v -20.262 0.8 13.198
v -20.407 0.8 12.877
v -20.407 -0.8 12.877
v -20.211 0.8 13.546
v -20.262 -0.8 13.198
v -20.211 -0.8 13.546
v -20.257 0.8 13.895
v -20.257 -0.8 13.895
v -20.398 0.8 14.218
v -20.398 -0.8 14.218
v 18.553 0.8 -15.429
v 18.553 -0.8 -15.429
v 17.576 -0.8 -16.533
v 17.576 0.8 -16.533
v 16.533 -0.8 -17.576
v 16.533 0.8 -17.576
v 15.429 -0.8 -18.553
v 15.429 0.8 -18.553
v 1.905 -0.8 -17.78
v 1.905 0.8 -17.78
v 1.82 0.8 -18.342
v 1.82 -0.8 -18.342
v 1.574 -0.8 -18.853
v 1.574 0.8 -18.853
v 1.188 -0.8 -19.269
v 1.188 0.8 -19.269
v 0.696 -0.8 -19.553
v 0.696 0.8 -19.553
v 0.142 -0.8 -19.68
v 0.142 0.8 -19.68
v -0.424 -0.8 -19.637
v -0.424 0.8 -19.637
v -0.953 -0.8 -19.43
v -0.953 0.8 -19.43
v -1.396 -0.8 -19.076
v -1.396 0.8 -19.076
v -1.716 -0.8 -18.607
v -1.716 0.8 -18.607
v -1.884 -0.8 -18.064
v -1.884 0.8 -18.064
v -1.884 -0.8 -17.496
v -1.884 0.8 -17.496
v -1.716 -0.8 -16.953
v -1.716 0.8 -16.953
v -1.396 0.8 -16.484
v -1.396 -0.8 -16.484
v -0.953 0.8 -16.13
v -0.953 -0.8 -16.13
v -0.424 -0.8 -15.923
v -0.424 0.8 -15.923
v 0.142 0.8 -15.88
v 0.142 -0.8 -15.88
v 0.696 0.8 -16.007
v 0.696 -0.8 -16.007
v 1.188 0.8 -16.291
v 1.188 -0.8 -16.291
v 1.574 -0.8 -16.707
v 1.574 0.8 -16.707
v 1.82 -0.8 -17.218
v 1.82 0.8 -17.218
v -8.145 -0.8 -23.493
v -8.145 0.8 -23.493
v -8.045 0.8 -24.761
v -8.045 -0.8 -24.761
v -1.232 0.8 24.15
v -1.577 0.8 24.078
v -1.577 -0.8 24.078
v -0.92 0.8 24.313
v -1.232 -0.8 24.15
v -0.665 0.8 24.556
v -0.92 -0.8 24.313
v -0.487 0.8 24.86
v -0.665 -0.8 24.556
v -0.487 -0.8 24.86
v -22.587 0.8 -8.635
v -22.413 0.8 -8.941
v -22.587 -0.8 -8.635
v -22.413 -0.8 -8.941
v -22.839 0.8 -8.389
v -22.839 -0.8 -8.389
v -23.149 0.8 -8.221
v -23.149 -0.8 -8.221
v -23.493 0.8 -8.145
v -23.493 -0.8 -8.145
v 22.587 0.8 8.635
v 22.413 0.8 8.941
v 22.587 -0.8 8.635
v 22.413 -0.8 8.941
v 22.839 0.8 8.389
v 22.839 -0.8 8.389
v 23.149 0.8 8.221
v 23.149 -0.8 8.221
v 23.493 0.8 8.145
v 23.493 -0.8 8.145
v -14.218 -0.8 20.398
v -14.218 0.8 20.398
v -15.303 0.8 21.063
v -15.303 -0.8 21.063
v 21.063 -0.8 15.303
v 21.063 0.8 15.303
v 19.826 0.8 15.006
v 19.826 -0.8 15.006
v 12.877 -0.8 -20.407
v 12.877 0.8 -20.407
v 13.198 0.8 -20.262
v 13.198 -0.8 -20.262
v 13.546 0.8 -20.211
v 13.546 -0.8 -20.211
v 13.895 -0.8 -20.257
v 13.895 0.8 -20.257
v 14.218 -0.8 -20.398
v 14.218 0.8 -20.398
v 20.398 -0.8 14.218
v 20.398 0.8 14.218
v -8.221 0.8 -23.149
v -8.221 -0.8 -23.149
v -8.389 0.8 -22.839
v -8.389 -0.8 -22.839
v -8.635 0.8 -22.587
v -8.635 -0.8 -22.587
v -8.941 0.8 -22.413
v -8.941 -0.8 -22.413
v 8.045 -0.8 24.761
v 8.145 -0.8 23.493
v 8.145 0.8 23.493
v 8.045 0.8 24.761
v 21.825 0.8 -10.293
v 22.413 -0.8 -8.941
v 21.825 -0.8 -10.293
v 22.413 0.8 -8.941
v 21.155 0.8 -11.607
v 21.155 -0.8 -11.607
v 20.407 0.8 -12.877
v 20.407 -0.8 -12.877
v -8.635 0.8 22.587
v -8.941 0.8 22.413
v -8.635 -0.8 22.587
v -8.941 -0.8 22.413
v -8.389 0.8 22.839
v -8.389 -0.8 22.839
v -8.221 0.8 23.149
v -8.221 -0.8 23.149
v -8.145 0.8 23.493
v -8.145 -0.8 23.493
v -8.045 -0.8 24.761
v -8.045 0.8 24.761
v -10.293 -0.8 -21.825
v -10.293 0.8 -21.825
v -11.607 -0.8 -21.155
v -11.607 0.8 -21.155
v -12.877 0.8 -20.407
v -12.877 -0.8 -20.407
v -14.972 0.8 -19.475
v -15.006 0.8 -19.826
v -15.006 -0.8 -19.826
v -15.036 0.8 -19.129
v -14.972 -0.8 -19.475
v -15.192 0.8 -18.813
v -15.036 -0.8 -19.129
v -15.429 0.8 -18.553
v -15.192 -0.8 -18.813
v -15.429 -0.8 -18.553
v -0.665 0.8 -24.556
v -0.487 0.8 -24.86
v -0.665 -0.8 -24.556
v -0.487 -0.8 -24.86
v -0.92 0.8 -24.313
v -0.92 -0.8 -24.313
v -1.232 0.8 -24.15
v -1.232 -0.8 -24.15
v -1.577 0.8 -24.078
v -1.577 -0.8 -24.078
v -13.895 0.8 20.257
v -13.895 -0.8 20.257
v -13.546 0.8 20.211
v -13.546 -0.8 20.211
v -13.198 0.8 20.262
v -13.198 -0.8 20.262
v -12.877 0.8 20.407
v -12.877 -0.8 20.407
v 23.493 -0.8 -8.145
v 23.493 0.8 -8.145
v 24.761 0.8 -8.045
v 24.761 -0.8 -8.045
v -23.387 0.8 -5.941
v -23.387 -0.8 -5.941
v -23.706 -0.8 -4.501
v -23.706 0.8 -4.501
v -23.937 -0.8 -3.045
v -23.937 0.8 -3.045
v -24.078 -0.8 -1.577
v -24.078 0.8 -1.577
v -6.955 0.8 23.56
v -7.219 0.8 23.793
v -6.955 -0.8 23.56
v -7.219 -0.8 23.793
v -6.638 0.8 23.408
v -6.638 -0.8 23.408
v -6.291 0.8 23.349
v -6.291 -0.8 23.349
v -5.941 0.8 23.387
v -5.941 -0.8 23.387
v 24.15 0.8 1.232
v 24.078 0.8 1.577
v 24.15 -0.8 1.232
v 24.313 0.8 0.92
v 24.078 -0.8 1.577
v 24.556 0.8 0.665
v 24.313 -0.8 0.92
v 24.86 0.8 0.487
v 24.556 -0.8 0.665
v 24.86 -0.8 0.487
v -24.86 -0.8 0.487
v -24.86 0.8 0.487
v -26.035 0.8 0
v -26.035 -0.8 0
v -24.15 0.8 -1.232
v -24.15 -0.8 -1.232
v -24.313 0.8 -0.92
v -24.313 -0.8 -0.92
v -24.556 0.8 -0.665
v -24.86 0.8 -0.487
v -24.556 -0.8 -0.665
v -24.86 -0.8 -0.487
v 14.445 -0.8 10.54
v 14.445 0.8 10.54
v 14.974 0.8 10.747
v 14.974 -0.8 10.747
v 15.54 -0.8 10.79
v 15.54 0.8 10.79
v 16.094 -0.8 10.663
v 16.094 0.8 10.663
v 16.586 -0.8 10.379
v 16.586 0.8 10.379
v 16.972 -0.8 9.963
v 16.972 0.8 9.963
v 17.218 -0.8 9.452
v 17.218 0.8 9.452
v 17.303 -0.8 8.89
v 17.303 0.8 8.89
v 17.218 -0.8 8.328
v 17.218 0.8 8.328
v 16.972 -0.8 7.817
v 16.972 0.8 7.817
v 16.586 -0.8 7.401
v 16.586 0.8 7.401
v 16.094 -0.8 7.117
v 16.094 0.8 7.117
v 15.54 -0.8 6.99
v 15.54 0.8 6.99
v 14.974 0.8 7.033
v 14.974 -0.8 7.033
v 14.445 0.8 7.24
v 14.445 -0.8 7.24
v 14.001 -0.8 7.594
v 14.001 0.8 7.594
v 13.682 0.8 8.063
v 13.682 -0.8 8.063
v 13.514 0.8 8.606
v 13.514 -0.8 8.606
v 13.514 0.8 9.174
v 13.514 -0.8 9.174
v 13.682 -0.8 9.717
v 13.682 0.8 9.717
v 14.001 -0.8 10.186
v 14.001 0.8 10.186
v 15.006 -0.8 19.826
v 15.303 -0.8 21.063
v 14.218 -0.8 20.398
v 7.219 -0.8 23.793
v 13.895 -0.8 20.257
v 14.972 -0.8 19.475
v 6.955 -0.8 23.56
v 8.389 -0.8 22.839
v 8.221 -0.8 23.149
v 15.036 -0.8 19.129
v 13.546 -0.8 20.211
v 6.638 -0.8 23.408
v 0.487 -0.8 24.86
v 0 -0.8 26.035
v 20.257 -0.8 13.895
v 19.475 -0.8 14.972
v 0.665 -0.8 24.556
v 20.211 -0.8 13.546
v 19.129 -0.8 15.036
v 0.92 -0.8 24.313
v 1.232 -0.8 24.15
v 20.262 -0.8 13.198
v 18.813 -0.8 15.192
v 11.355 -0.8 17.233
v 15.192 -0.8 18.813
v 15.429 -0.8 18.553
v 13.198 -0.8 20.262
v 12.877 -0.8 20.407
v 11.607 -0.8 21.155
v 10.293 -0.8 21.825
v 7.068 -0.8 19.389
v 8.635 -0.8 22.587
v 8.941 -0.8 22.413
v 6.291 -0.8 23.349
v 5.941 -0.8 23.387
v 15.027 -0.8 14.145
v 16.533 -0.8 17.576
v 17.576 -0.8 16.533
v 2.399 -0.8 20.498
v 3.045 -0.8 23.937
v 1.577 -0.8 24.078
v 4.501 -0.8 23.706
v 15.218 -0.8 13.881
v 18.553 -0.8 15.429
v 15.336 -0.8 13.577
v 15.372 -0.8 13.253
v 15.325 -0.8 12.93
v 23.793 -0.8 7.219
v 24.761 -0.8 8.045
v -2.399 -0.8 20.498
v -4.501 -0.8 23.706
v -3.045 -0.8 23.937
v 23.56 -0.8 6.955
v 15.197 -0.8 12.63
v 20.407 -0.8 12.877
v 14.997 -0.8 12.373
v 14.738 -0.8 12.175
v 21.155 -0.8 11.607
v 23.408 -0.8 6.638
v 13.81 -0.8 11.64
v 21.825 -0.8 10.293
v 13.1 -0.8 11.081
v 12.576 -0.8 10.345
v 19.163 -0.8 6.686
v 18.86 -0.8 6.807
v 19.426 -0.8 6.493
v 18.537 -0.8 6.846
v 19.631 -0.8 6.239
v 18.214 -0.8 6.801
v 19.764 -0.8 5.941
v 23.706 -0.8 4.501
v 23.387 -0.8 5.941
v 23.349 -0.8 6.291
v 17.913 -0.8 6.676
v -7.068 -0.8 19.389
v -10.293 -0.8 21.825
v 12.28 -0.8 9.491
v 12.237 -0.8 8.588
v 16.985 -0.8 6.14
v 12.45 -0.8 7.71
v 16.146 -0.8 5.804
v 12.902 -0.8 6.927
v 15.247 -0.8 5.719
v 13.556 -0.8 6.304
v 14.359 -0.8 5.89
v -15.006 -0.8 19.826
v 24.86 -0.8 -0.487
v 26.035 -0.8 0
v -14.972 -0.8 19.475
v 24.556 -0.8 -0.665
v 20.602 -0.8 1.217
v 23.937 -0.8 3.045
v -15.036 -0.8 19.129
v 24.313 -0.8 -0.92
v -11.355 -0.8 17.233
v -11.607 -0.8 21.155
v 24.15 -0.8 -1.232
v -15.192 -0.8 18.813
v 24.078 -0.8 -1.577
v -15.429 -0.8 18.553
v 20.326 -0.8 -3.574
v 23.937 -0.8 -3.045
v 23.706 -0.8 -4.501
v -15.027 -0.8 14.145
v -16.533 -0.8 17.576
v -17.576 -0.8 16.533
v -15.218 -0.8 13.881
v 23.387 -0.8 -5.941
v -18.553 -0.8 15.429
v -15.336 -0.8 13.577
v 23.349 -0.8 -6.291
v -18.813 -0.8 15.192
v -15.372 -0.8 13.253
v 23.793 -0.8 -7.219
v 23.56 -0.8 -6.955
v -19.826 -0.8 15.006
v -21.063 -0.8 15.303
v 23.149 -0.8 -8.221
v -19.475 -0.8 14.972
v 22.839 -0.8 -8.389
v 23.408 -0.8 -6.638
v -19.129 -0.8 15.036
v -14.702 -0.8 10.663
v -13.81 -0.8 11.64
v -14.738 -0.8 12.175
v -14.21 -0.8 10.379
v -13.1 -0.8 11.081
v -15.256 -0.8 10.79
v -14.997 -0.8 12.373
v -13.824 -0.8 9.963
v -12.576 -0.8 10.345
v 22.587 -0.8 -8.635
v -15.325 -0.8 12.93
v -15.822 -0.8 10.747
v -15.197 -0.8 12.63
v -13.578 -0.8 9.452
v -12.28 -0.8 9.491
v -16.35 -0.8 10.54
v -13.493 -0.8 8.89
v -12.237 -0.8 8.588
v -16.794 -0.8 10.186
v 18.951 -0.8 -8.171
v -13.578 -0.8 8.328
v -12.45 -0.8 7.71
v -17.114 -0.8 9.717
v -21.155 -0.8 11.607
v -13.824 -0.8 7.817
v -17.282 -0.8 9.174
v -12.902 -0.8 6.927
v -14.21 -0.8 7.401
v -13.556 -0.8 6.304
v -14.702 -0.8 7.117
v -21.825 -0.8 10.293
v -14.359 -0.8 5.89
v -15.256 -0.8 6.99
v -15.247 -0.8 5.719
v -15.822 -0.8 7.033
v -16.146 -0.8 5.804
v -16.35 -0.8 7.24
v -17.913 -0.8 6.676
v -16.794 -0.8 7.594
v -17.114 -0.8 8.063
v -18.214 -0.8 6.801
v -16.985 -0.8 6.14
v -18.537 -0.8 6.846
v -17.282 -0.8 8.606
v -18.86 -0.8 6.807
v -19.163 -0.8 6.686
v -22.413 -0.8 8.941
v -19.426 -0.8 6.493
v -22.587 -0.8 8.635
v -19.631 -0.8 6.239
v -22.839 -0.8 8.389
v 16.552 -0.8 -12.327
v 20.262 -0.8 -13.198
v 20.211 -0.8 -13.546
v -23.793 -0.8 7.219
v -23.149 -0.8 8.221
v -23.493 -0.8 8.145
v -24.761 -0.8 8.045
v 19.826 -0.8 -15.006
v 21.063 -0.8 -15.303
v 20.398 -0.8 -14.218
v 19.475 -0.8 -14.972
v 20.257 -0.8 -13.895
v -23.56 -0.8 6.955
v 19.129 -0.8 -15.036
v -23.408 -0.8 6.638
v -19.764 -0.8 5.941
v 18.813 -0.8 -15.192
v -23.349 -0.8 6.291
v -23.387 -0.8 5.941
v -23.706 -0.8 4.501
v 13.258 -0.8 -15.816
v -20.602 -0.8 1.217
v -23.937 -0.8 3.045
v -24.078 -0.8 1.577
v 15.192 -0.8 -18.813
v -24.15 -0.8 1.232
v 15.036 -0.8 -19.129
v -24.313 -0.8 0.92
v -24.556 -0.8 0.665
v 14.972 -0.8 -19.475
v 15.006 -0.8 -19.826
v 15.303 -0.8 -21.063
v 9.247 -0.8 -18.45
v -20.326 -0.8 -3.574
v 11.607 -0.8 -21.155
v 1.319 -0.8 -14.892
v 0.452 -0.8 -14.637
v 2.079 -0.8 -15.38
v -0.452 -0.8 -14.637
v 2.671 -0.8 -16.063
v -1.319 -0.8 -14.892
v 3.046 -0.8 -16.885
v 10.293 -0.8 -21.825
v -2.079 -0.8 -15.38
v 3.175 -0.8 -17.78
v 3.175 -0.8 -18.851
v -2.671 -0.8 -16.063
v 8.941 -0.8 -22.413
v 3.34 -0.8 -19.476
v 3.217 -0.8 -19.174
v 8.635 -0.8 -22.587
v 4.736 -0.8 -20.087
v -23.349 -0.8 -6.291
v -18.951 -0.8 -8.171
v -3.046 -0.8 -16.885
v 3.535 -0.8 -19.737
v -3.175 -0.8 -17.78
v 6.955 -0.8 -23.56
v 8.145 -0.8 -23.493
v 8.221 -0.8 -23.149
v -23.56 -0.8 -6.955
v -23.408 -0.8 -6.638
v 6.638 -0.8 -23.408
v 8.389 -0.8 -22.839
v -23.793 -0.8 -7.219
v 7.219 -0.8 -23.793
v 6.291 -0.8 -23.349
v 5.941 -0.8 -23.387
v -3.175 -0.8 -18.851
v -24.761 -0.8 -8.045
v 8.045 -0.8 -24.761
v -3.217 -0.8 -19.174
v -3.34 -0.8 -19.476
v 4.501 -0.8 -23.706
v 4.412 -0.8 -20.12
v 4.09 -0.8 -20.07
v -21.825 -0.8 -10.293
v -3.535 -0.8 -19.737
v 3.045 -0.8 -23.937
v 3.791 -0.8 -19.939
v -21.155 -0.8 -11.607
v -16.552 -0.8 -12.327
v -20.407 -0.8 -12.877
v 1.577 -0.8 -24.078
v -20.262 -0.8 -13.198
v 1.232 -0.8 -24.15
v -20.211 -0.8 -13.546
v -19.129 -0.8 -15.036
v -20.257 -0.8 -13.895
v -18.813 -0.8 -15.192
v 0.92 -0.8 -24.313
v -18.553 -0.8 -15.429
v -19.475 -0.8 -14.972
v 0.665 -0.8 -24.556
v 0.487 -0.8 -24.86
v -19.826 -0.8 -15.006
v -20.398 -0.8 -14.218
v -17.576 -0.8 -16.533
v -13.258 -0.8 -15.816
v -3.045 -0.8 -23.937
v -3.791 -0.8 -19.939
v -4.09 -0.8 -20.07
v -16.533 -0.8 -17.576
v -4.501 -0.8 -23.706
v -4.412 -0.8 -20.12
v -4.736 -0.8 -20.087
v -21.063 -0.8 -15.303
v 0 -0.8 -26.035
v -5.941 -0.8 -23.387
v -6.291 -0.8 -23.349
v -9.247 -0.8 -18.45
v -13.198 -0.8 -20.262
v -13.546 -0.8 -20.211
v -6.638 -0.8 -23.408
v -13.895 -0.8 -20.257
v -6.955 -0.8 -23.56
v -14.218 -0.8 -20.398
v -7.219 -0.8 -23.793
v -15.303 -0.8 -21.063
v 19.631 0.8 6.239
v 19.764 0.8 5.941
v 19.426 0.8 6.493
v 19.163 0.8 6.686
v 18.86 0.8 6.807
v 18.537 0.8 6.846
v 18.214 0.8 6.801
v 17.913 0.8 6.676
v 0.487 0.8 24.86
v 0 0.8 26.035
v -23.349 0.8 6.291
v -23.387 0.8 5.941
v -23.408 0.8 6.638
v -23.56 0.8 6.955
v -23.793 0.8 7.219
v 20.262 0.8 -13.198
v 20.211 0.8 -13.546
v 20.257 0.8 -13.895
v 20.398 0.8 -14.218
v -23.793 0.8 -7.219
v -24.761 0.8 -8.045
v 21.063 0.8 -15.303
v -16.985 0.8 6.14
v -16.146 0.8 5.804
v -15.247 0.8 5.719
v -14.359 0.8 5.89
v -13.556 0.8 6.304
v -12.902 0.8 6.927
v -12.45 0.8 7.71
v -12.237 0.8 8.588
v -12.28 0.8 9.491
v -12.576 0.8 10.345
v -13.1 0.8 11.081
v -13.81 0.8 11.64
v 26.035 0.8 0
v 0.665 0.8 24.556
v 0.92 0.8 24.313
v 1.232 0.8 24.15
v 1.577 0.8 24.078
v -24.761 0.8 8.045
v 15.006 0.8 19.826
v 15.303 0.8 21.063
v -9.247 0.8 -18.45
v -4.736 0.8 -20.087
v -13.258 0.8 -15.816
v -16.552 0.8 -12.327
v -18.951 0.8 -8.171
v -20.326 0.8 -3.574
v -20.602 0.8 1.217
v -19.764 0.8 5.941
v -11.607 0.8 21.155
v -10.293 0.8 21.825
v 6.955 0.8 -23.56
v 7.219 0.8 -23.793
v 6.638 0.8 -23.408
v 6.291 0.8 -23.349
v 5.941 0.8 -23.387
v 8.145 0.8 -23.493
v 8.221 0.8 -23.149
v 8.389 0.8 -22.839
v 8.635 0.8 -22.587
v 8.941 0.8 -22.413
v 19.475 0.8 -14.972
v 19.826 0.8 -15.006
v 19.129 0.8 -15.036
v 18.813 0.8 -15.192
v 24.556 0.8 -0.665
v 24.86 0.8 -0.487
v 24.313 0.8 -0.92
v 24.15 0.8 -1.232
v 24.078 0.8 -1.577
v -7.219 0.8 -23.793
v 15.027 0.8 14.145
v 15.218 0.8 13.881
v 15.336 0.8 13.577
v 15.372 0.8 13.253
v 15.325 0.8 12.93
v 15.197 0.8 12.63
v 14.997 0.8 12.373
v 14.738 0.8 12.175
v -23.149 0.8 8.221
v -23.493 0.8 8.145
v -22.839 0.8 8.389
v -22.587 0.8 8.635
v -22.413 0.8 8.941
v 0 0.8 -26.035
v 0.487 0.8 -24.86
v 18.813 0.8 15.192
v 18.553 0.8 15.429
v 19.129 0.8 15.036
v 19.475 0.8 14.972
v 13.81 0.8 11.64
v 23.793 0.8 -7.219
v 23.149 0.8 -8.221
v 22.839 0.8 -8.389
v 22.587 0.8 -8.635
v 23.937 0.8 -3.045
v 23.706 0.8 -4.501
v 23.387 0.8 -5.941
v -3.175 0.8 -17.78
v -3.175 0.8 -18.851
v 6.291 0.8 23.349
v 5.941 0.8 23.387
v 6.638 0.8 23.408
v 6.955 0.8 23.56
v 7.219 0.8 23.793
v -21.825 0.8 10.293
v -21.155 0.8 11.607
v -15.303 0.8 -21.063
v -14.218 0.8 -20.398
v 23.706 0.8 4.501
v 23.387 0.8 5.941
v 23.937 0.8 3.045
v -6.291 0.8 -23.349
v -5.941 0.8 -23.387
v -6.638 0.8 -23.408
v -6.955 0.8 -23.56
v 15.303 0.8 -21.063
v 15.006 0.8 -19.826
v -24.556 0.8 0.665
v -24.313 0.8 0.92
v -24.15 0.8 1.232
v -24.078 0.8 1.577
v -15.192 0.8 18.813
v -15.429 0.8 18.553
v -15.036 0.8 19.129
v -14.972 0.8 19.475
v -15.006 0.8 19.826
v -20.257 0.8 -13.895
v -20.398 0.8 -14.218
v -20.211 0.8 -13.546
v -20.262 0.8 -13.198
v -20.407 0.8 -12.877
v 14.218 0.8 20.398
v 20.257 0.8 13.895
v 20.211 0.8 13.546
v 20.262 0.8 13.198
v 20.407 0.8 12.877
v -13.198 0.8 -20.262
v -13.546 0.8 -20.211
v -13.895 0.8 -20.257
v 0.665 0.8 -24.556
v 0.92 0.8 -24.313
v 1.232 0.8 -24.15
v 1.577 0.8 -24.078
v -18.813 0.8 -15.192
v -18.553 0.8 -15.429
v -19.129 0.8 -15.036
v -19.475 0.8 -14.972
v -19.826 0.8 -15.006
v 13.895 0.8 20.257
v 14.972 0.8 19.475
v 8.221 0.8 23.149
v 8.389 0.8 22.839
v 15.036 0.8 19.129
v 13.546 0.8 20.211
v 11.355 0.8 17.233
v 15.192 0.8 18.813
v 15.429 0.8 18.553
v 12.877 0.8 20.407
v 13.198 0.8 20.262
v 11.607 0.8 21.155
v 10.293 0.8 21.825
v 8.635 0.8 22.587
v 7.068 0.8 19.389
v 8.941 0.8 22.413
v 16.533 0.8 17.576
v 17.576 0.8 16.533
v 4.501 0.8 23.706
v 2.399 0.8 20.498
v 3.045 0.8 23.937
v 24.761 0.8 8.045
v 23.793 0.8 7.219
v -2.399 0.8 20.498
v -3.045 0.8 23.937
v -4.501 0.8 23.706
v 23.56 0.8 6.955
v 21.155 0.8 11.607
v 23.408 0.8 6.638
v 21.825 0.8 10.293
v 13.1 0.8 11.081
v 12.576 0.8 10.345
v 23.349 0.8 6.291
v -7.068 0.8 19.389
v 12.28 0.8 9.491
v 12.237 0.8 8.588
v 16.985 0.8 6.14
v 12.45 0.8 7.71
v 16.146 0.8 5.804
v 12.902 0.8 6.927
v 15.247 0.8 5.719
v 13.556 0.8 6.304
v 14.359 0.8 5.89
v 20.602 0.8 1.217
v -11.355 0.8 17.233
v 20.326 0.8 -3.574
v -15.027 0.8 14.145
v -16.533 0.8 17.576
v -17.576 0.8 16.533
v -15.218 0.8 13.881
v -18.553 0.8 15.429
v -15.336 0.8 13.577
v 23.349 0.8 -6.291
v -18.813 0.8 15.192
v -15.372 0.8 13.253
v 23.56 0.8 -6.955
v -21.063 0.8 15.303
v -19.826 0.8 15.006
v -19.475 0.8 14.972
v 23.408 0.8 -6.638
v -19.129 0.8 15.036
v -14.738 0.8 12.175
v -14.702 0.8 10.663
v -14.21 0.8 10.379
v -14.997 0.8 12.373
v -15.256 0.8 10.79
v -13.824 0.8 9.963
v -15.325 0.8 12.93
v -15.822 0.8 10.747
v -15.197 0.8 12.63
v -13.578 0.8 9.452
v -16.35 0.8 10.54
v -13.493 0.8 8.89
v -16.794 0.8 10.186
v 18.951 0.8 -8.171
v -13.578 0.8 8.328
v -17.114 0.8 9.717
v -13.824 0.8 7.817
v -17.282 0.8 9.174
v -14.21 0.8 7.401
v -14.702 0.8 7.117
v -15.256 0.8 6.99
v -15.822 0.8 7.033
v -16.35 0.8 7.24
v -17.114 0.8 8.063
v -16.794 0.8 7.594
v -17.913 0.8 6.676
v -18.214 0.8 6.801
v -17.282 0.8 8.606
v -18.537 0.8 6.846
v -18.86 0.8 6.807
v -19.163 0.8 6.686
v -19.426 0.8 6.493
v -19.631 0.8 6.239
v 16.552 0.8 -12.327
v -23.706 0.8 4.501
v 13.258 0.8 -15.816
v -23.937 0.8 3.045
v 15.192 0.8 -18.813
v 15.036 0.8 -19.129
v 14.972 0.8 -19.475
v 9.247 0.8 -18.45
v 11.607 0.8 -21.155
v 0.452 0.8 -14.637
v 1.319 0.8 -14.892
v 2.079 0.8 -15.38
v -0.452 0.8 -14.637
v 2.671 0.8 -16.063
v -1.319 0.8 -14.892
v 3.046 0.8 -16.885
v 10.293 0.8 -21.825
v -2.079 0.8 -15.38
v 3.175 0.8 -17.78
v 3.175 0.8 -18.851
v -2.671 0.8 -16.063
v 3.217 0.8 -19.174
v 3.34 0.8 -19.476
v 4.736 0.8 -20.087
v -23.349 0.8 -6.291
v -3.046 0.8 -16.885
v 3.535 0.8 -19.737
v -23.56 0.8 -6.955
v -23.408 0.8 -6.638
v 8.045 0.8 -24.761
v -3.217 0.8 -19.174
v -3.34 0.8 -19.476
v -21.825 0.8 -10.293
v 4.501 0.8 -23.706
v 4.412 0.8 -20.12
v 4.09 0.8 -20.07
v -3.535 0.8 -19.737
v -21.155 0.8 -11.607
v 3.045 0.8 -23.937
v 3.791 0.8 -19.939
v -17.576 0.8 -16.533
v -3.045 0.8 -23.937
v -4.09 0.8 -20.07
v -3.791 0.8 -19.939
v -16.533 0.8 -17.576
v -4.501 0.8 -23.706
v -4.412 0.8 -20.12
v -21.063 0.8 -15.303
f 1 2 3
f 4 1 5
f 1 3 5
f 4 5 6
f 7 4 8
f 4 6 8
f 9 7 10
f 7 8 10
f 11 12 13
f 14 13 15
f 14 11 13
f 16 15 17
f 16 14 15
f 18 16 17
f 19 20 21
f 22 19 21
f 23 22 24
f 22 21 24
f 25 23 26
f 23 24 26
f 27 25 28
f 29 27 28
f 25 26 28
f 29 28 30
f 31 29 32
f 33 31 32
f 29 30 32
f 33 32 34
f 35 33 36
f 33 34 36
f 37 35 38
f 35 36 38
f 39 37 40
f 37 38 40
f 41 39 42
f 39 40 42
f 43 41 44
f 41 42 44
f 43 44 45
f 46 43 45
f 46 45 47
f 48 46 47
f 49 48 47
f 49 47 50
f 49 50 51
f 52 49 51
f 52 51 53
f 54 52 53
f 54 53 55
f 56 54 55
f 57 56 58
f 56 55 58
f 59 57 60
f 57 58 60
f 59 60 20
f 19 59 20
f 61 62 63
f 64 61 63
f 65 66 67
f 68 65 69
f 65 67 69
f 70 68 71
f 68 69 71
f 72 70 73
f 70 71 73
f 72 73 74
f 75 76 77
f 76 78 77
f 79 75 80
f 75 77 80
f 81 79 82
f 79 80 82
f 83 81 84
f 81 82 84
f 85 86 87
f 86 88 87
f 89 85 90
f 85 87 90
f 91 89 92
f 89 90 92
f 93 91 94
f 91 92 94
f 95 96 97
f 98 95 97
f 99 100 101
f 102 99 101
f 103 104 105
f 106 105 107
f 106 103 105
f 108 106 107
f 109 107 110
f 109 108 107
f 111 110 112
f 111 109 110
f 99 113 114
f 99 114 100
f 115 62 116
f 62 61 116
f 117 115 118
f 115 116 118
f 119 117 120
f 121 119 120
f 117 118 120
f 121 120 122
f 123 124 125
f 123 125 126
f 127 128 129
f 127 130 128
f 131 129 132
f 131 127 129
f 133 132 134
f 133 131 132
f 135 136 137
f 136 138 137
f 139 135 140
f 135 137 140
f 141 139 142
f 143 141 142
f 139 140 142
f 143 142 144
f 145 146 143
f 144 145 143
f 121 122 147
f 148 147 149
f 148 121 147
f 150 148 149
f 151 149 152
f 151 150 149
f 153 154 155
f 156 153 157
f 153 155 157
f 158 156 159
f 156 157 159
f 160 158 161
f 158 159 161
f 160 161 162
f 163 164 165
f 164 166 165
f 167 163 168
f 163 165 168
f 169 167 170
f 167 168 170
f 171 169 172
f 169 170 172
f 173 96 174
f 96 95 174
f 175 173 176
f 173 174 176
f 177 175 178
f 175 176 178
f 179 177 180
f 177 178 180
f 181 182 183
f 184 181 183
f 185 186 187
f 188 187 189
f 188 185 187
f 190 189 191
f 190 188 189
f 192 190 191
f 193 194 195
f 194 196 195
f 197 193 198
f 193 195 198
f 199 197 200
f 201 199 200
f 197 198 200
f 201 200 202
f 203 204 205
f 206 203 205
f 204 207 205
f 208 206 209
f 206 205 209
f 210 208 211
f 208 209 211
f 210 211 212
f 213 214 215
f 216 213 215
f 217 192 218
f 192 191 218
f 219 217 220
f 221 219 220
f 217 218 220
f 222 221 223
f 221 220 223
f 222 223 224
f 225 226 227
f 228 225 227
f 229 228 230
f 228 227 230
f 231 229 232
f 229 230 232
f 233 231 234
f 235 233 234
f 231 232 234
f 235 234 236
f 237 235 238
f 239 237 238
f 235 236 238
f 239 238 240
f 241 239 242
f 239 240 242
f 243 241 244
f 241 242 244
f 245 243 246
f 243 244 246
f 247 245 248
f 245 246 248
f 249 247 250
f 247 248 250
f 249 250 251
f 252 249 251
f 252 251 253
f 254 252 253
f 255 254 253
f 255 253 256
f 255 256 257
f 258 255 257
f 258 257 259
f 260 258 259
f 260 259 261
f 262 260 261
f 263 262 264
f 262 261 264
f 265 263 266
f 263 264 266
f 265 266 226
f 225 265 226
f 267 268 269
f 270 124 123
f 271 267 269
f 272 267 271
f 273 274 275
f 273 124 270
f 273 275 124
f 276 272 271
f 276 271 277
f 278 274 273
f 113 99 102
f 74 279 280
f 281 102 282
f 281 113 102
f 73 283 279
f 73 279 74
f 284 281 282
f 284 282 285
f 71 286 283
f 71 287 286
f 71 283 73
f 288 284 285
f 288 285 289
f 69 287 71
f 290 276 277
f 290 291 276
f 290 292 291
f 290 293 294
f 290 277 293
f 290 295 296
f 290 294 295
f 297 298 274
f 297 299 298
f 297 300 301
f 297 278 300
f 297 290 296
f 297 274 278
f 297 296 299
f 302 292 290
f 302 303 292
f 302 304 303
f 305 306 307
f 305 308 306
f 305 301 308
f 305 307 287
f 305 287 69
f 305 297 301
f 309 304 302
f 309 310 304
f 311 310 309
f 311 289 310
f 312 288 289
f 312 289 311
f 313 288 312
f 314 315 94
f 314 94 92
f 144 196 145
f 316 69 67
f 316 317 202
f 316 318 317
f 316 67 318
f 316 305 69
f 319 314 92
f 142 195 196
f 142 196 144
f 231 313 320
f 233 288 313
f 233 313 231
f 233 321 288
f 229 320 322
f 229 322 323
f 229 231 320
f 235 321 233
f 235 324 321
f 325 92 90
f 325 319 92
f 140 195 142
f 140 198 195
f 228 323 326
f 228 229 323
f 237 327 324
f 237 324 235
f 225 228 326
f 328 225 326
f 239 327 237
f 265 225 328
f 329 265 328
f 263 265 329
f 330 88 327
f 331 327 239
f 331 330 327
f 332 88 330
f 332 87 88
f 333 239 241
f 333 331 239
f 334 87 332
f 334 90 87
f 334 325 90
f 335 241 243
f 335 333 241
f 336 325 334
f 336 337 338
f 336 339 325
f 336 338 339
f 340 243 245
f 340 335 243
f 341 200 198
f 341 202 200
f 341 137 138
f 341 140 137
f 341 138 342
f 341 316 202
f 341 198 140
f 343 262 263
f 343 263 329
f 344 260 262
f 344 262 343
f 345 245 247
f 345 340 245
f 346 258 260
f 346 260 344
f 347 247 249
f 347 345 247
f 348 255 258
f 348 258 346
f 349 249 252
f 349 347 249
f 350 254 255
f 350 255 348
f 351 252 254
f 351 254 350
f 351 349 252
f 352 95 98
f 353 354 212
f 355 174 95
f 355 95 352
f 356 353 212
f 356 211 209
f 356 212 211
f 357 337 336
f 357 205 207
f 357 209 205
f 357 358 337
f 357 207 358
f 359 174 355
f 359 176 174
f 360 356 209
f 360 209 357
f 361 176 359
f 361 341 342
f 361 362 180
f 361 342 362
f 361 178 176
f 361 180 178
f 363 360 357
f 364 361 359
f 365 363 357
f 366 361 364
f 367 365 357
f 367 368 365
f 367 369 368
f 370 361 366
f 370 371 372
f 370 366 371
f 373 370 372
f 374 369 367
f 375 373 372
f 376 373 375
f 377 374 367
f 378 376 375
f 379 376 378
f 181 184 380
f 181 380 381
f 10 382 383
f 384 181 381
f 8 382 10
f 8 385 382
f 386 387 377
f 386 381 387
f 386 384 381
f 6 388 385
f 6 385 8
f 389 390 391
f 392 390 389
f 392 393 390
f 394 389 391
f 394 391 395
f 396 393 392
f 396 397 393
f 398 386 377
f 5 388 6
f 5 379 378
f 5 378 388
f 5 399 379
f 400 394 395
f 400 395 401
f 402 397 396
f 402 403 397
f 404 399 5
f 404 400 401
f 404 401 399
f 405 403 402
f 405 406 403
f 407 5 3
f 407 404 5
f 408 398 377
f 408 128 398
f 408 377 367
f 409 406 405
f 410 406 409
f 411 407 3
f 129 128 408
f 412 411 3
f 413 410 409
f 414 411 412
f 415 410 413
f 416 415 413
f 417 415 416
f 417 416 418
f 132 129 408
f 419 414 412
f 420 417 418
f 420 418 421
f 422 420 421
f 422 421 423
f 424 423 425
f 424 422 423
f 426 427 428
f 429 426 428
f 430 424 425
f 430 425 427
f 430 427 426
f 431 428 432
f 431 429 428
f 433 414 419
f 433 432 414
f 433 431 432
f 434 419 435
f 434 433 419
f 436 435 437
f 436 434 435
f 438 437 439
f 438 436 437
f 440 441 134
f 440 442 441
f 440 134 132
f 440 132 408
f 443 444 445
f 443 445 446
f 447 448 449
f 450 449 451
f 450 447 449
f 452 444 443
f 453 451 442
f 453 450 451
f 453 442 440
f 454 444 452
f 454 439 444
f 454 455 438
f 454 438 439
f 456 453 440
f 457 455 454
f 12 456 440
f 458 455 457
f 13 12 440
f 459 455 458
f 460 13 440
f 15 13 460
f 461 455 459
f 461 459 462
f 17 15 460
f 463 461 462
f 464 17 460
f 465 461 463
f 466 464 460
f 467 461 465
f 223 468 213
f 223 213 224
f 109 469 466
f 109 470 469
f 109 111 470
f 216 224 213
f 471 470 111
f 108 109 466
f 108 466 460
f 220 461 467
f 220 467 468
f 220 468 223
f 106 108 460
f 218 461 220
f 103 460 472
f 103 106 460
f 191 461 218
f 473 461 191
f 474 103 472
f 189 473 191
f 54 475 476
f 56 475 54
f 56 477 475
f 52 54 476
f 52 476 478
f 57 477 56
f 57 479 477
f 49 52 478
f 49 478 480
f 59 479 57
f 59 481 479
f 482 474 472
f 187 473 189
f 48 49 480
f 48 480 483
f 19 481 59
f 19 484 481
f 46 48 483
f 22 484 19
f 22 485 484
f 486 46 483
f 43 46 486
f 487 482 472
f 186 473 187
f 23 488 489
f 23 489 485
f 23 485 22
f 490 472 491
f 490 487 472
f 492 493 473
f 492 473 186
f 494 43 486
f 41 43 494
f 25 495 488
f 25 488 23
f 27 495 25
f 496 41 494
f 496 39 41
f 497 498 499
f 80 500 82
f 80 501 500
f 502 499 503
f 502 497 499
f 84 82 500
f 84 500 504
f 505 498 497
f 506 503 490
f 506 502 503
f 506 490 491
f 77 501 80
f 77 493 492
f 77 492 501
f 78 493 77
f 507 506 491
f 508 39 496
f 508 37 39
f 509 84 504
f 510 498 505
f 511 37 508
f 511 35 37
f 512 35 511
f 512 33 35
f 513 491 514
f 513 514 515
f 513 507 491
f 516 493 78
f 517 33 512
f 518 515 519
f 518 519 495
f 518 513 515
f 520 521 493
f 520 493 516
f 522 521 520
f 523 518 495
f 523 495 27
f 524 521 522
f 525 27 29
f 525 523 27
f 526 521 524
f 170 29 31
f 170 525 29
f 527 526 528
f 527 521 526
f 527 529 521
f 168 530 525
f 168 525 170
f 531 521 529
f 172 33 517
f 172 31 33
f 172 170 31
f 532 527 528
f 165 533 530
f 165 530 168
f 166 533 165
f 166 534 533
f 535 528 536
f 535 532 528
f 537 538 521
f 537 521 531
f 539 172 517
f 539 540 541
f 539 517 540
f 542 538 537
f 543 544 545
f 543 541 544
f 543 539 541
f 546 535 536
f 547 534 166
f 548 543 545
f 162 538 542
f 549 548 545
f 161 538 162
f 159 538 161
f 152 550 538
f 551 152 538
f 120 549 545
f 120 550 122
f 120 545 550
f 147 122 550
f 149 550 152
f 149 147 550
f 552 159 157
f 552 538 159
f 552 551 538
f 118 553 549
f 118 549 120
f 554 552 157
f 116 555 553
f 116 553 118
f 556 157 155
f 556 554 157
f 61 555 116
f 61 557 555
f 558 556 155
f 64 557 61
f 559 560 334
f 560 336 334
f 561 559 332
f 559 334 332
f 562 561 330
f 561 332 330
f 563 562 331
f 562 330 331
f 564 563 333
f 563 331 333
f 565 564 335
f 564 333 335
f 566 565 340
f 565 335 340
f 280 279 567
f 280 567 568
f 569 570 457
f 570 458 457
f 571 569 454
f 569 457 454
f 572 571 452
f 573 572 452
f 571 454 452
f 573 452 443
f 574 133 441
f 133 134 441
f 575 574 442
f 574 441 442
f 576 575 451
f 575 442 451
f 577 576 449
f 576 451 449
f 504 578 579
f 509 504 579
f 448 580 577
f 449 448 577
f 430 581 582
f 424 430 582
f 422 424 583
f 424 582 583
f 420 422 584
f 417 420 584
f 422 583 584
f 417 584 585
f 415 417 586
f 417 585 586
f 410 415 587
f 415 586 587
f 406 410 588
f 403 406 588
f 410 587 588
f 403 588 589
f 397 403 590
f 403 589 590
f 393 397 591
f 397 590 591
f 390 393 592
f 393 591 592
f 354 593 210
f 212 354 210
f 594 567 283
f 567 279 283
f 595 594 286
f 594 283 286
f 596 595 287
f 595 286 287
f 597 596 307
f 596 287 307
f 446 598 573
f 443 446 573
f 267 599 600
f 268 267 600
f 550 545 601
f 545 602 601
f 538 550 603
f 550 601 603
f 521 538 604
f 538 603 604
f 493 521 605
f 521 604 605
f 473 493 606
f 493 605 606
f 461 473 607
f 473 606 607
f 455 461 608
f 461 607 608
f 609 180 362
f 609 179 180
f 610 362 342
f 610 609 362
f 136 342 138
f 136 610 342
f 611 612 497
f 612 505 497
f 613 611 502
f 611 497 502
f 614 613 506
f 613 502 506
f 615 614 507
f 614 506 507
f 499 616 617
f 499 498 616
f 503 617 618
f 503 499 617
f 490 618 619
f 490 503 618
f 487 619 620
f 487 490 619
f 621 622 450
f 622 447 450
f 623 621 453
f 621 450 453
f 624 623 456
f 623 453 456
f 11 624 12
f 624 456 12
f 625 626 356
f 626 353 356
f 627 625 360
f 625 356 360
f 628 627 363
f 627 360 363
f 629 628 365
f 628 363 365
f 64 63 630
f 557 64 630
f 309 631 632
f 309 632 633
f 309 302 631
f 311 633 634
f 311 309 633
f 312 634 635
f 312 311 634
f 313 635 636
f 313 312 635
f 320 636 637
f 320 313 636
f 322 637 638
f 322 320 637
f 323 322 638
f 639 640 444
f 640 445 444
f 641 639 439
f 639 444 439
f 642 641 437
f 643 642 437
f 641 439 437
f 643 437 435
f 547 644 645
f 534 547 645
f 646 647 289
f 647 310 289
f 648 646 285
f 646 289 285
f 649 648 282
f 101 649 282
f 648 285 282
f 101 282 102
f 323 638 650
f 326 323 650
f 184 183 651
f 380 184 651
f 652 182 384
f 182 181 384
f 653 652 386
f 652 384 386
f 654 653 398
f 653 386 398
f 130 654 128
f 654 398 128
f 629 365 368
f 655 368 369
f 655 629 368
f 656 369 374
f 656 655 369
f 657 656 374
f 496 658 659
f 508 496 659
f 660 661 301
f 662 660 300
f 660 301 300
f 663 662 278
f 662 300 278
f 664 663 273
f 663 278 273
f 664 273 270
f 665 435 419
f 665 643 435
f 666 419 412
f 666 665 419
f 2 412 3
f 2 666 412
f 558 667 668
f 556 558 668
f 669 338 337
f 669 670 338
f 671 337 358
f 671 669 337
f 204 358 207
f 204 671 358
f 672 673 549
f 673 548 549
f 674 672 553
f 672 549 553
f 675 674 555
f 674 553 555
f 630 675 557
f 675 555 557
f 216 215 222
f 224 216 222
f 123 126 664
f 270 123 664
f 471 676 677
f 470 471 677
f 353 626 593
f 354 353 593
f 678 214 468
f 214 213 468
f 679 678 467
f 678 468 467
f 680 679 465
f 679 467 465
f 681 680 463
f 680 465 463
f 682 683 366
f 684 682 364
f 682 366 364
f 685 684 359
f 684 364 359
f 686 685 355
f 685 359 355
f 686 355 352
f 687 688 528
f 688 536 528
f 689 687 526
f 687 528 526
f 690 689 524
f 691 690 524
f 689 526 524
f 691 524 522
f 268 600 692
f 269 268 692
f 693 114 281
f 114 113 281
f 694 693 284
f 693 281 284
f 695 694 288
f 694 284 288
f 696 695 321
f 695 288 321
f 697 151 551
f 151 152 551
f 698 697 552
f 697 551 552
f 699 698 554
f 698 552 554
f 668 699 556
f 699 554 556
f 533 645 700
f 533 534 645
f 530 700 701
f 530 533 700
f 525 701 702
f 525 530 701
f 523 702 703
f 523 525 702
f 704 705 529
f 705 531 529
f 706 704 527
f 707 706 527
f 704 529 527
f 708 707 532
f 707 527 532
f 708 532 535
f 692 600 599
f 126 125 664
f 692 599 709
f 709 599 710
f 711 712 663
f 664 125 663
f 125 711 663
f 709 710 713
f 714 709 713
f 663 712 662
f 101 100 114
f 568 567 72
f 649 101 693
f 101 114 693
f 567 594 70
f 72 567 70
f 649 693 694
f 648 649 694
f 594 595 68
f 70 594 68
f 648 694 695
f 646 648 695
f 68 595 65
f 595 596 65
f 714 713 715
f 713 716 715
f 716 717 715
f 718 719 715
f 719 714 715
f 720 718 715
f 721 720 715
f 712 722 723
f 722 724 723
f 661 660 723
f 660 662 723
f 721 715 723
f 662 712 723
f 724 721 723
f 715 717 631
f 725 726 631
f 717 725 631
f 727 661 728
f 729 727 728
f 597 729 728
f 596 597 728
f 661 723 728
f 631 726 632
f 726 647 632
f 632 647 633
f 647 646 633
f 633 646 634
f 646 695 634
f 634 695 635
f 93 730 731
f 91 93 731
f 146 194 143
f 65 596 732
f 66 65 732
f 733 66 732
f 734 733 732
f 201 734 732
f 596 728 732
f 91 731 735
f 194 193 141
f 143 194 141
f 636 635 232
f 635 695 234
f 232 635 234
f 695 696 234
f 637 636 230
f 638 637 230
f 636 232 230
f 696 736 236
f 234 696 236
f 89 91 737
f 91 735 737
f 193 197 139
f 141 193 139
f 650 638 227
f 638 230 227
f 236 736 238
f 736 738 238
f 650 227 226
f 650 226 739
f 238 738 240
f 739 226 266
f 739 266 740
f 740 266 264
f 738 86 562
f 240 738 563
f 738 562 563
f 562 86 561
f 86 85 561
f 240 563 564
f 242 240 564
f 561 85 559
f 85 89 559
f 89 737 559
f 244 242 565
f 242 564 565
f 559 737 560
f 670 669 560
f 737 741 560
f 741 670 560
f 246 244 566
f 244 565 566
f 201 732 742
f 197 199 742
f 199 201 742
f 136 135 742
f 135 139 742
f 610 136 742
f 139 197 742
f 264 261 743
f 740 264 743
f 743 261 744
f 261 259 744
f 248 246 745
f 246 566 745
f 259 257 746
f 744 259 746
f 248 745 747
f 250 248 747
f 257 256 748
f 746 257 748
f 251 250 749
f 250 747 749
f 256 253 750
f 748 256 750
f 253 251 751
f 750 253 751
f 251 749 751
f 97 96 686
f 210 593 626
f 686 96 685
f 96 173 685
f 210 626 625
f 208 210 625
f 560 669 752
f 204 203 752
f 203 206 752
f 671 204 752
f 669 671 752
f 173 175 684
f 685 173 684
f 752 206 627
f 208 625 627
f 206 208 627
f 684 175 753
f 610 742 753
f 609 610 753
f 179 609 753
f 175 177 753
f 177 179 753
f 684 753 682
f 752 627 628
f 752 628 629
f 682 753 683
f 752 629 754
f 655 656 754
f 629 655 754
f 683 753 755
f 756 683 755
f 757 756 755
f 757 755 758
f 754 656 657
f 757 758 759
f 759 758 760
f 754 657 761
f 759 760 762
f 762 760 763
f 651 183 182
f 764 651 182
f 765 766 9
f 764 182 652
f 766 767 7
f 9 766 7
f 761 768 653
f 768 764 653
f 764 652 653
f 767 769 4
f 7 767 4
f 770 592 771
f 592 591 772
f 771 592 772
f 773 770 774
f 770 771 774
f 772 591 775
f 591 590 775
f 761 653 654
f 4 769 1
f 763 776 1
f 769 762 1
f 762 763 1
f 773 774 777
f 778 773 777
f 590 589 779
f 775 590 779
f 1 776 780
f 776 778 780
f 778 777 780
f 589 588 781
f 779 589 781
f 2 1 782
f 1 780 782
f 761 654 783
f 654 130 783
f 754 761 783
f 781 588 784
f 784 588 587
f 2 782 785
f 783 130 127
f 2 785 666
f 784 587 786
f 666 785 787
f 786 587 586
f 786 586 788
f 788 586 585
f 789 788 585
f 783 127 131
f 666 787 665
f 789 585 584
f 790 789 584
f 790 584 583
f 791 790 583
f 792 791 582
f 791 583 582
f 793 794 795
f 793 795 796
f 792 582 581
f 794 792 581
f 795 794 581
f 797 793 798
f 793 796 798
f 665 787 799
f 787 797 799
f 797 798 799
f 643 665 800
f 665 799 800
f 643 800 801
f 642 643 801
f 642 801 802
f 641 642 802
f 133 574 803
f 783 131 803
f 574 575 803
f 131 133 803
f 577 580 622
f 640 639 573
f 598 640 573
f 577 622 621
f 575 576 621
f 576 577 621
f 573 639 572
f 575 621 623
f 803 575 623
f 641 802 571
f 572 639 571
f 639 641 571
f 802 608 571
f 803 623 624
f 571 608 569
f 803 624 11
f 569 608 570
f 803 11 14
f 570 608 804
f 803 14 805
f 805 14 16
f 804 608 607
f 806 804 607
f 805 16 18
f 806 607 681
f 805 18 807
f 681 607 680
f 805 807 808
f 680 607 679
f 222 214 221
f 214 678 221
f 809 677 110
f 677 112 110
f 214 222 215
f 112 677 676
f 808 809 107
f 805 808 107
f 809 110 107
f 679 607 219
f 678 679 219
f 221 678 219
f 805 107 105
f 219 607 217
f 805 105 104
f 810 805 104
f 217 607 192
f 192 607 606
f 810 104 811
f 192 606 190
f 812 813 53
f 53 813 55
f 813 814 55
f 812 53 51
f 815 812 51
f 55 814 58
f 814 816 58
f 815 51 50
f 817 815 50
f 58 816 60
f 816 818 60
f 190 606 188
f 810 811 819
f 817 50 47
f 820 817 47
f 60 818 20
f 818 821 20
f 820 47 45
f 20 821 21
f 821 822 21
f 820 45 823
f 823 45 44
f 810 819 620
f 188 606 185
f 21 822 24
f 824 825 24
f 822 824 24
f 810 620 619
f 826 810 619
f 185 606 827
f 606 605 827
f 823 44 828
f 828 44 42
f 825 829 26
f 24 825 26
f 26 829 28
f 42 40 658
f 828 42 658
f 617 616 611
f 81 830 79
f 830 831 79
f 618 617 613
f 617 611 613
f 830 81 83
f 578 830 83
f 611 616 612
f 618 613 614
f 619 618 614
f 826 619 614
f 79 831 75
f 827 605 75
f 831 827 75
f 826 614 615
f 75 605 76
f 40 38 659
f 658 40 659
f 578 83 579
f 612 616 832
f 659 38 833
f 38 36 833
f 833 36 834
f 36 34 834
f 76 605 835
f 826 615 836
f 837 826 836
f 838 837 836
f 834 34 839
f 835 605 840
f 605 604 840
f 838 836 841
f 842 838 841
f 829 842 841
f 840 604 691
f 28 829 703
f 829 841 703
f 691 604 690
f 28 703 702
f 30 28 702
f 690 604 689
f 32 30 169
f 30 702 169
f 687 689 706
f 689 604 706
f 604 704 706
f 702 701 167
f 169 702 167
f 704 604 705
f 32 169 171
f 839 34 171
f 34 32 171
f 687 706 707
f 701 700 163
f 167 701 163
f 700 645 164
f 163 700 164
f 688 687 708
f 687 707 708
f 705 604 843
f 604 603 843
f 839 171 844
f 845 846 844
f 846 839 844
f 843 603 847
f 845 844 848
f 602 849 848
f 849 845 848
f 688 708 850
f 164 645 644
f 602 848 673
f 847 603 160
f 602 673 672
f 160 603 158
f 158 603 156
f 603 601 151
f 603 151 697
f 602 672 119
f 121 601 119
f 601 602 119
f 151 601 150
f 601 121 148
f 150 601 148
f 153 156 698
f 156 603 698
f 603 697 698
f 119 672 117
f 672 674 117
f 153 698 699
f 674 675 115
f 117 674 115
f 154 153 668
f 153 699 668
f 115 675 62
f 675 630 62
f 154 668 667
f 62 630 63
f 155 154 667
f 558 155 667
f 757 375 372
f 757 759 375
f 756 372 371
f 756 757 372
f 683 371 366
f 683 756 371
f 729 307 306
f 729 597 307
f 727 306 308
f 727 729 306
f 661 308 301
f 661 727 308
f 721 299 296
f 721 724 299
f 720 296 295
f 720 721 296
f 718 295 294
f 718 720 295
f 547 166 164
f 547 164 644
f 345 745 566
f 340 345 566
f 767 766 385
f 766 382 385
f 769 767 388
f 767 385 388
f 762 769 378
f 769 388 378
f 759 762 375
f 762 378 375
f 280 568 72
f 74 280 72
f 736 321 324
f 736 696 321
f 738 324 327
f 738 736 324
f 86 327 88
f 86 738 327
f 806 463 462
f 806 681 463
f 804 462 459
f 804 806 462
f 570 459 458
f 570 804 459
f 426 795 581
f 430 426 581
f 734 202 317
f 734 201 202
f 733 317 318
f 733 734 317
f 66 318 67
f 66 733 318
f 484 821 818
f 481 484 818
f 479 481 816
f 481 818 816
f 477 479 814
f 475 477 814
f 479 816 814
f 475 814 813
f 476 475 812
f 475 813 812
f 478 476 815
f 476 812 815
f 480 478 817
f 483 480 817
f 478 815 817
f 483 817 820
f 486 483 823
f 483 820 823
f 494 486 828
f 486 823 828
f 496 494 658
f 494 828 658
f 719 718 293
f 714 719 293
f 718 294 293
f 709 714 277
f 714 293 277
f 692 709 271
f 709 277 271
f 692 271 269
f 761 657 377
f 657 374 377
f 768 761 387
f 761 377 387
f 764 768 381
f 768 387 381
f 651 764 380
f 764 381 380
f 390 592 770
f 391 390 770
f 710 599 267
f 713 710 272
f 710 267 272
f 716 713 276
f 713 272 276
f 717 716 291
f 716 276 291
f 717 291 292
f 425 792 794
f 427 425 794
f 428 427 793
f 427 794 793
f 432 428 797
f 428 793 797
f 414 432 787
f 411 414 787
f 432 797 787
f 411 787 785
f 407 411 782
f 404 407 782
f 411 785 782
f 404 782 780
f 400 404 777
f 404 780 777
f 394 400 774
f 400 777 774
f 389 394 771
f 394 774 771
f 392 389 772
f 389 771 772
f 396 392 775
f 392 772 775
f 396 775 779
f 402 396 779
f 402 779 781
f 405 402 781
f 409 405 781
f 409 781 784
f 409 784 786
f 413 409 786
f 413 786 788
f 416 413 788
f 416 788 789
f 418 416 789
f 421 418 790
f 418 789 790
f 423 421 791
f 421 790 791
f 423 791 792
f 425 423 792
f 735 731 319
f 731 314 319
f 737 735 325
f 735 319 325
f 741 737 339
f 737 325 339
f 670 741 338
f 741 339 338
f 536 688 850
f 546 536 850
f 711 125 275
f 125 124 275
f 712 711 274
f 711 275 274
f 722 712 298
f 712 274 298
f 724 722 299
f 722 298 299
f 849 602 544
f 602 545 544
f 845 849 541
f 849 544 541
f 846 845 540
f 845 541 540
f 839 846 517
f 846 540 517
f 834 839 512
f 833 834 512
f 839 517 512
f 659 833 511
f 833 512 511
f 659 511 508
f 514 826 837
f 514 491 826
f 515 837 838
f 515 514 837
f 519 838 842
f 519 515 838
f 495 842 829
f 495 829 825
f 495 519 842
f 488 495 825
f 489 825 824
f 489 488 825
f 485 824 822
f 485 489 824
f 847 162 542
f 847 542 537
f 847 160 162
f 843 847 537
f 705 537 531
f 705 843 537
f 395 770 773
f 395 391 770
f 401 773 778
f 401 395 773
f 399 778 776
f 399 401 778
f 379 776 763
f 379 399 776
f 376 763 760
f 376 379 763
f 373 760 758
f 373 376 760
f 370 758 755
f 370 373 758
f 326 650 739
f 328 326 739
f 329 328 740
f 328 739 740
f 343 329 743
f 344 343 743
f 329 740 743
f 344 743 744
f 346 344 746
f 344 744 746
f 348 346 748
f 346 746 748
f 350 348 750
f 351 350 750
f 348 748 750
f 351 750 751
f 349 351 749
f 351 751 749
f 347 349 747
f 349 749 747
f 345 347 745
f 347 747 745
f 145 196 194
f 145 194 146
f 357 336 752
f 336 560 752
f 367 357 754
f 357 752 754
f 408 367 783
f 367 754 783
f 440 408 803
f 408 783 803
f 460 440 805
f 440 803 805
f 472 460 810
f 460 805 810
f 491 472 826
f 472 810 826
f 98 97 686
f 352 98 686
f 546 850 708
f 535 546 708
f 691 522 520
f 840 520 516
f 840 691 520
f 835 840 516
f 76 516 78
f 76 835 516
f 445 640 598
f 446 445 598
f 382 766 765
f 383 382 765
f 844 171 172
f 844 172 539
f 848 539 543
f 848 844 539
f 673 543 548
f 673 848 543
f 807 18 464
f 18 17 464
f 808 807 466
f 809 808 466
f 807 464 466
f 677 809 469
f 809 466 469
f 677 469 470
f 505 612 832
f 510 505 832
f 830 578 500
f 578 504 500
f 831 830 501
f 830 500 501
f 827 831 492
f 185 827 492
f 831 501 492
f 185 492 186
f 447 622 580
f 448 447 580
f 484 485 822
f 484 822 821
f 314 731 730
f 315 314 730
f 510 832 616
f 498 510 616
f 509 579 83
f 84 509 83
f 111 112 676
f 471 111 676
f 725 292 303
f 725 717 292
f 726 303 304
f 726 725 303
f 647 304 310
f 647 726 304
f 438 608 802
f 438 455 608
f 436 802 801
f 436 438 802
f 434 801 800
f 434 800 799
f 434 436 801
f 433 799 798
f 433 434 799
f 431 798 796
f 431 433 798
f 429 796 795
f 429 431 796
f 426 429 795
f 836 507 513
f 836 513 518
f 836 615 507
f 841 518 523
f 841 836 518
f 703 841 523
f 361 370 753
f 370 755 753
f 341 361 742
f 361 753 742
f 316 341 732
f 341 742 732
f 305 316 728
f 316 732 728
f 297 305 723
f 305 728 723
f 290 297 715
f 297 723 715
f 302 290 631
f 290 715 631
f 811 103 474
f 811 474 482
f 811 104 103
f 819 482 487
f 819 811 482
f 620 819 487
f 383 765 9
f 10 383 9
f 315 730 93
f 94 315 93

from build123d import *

# Parameters (mm, degrees)
SKETCH1_R                = 24.13
BOSS_EXTRUDE1_DEPTH      = 0.8001
BOSS_EXTRUDE2_DEPTH      = 1.6002
FILLET1_R                = 1.27
CIRPATTERN1_COUNT        = 20
FILLET1_OF_CIRPATTERN1_R = 1.27
SKETCH3_R                = 20.6375
CUT_EXTRUDE1_DEPTH       = 2.6002
SKETCH4_R                = 1.905
BOSS_EXTRUDE3_DEPTH      = 1.6002
FILLET2_R                = 1.27
CIRPATTERN2_COUNT        = 3
FILLET2_OF_CIRPATTERN2_R = 1.27


with BuildPart() as part:
    # Sketch1 → Boss-Extrude1 (new body, symmetric)
    with BuildSketch(Plane(origin=(0, 0, 0), x_dir=(1, 0, 0), z_dir=(0, 1, 0))):
        Circle(SKETCH1_R)
    extrude(amount=BOSS_EXTRUDE1_DEPTH, both=True)

    # Sketch2 → Boss-Extrude2 (add, through all)
    with BuildSketch(Plane(origin=(0, 0.8001, 0), x_dir=(1, 0, 0), z_dir=(0, 1, 0))):
        Polygon((-0.794496075, 24.116916801), (0, 26.035), (0.794496075, 24.116916801), align=None)
    boss_extrude2 = extrude(amount=-BOSS_EXTRUDE2_DEPTH)

    # Fillet1
    fillet1_edges = [part.edges().sort_by_distance(p)[0] for p in [
        (0.794496075, 0, -24.116916801),
        (-0.794496075, 0, -24.116916801),
    ]]
    fillet(fillet1_edges, radius=FILLET1_R)

    # CirPattern1: Boss-Extrude2 ×20 about axis
    cirpattern1_axis = Axis((0, 0, 0), (0, 1, 0))
    for i in range(1, CIRPATTERN1_COUNT):
        add(boss_extrude2.rotate(cirpattern1_axis, i * 360 / CIRPATTERN1_COUNT))

    # Fillet1 of CirPattern1
    fillet1_of_cirpattern1_edges = [part.edges().sort_by_distance(p)[0] for p in [
        (-6.696926474, 0, -23.182063666),
        (-8.208147813, 0, -22.691038087),
        (-13.5328072, 0, -19.97798862),
        (-14.818328853, 0, -19.044002468),
        (-19.044002468, 0, -14.818328853),
        (-19.97798862, 0, -13.5328072),
        (-22.691038087, 0, -8.208147813),
        (-23.182063666, 0, -6.696926474),
        (-24.116916801, 0, -0.794496075),
        (-24.116916801, 0, 0.794496075),
        (-23.182063666, 0, 6.696926474),
        (-22.691038087, 0, 8.208147813),
        (-19.97798862, 0, 13.5328072),
        (-19.044002468, 0, 14.818328853),
        (-14.818328853, 0, 19.044002468),
        (-13.5328072, 0, 19.97798862),
        (-8.208147813, 0, 22.691038087),
        (-6.696926474, 0, 23.182063666),
        (-0.794496075, 0, 24.116916801),
        (0.794496075, 0, 24.116916801),
        (6.696926474, 0, 23.182063666),
        (8.208147813, 0, 22.691038087),
        (13.5328072, 0, 19.97798862),
        (14.818328853, 0, 19.044002468),
        (19.044002468, 0, 14.818328853),
        (19.97798862, 0, 13.5328072),
        (22.691038087, 0, 8.208147813),
        (23.182063666, 0, 6.696926474),
        (24.116916801, 0, 0.794496075),
        (24.116916801, 0, -0.794496075),
        (23.182063666, 0, -6.696926474),
        (22.691038087, 0, -8.208147813),
        (19.97798862, 0, -13.5328072),
        (19.044002468, 0, -14.818328853),
        (14.818328853, 0, -19.044002468),
        (13.5328072, 0, -19.97798862),
        (8.208147813, 0, -22.691038087),
        (6.696926474, 0, -23.182063666),
    ]]
    fillet(fillet1_of_cirpattern1_edges, radius=FILLET1_OF_CIRPATTERN1_R)

    # Sketch3 → Cut-Extrude1 (cut, through all)
    with BuildSketch(Plane(origin=(0, 0.8001, 0), x_dir=(1, 0, 0), z_dir=(0, 1, 0))):
        Circle(SKETCH3_R)
    extrude(amount=-CUT_EXTRUDE1_DEPTH, mode=Mode.SUBTRACT)

    # Sketch4 → Boss-Extrude3 (add, through all)
    with BuildSketch(Plane(origin=(0, 0.8001, 0), x_dir=(1, 0, 0), z_dir=(0, 1, 0))):
        with BuildLine():
            Line((-3.175, 17.78), (-3.175, 20.391806719))
            ThreePointArc((-3.175, 20.391806719), (0, 20.6375), (3.175, 20.391806719))
            Line((3.175, 20.391806719), (3.175, 17.78))
            ThreePointArc((3.175, 17.78), (0, 14.605), (-3.175, 17.78))
        make_face()
        with Locations((0, 17.78)):
            Circle(SKETCH4_R, mode=Mode.SUBTRACT)
    boss_extrude3 = extrude(amount=-BOSS_EXTRUDE3_DEPTH)

    # Fillet2
    fillet2_edges = [part.edges().sort_by_distance(p)[0] for p in [
        (-3.175, 0, -20.391806719),
        (3.175, 0, -20.391806719),
    ]]
    fillet(fillet2_edges, radius=FILLET2_R)

    # CirPattern2: Boss-Extrude3 ×3 about axis
    cirpattern2_axis = Axis((0, 0, 0), (0, 1, 0))
    for i in range(1, CIRPATTERN2_COUNT):
        add(boss_extrude3.rotate(cirpattern2_axis, i * 360 / CIRPATTERN2_COUNT))

    # Fillet2 of CirPattern2
    fillet2_of_cirpattern2_edges = [part.edges().sort_by_distance(p)[0] for p in [
        (-16.072322647, 0, 12.945534016),
        (-19.247322647, 0, 7.446272702),
        (19.247322647, 0, 7.446272702),
        (16.072322647, 0, 12.945534016),
    ]]
    fillet(fillet2_of_cirpattern2_edges, radius=FILLET2_OF_CIRPATTERN2_R)


solid = part.part
